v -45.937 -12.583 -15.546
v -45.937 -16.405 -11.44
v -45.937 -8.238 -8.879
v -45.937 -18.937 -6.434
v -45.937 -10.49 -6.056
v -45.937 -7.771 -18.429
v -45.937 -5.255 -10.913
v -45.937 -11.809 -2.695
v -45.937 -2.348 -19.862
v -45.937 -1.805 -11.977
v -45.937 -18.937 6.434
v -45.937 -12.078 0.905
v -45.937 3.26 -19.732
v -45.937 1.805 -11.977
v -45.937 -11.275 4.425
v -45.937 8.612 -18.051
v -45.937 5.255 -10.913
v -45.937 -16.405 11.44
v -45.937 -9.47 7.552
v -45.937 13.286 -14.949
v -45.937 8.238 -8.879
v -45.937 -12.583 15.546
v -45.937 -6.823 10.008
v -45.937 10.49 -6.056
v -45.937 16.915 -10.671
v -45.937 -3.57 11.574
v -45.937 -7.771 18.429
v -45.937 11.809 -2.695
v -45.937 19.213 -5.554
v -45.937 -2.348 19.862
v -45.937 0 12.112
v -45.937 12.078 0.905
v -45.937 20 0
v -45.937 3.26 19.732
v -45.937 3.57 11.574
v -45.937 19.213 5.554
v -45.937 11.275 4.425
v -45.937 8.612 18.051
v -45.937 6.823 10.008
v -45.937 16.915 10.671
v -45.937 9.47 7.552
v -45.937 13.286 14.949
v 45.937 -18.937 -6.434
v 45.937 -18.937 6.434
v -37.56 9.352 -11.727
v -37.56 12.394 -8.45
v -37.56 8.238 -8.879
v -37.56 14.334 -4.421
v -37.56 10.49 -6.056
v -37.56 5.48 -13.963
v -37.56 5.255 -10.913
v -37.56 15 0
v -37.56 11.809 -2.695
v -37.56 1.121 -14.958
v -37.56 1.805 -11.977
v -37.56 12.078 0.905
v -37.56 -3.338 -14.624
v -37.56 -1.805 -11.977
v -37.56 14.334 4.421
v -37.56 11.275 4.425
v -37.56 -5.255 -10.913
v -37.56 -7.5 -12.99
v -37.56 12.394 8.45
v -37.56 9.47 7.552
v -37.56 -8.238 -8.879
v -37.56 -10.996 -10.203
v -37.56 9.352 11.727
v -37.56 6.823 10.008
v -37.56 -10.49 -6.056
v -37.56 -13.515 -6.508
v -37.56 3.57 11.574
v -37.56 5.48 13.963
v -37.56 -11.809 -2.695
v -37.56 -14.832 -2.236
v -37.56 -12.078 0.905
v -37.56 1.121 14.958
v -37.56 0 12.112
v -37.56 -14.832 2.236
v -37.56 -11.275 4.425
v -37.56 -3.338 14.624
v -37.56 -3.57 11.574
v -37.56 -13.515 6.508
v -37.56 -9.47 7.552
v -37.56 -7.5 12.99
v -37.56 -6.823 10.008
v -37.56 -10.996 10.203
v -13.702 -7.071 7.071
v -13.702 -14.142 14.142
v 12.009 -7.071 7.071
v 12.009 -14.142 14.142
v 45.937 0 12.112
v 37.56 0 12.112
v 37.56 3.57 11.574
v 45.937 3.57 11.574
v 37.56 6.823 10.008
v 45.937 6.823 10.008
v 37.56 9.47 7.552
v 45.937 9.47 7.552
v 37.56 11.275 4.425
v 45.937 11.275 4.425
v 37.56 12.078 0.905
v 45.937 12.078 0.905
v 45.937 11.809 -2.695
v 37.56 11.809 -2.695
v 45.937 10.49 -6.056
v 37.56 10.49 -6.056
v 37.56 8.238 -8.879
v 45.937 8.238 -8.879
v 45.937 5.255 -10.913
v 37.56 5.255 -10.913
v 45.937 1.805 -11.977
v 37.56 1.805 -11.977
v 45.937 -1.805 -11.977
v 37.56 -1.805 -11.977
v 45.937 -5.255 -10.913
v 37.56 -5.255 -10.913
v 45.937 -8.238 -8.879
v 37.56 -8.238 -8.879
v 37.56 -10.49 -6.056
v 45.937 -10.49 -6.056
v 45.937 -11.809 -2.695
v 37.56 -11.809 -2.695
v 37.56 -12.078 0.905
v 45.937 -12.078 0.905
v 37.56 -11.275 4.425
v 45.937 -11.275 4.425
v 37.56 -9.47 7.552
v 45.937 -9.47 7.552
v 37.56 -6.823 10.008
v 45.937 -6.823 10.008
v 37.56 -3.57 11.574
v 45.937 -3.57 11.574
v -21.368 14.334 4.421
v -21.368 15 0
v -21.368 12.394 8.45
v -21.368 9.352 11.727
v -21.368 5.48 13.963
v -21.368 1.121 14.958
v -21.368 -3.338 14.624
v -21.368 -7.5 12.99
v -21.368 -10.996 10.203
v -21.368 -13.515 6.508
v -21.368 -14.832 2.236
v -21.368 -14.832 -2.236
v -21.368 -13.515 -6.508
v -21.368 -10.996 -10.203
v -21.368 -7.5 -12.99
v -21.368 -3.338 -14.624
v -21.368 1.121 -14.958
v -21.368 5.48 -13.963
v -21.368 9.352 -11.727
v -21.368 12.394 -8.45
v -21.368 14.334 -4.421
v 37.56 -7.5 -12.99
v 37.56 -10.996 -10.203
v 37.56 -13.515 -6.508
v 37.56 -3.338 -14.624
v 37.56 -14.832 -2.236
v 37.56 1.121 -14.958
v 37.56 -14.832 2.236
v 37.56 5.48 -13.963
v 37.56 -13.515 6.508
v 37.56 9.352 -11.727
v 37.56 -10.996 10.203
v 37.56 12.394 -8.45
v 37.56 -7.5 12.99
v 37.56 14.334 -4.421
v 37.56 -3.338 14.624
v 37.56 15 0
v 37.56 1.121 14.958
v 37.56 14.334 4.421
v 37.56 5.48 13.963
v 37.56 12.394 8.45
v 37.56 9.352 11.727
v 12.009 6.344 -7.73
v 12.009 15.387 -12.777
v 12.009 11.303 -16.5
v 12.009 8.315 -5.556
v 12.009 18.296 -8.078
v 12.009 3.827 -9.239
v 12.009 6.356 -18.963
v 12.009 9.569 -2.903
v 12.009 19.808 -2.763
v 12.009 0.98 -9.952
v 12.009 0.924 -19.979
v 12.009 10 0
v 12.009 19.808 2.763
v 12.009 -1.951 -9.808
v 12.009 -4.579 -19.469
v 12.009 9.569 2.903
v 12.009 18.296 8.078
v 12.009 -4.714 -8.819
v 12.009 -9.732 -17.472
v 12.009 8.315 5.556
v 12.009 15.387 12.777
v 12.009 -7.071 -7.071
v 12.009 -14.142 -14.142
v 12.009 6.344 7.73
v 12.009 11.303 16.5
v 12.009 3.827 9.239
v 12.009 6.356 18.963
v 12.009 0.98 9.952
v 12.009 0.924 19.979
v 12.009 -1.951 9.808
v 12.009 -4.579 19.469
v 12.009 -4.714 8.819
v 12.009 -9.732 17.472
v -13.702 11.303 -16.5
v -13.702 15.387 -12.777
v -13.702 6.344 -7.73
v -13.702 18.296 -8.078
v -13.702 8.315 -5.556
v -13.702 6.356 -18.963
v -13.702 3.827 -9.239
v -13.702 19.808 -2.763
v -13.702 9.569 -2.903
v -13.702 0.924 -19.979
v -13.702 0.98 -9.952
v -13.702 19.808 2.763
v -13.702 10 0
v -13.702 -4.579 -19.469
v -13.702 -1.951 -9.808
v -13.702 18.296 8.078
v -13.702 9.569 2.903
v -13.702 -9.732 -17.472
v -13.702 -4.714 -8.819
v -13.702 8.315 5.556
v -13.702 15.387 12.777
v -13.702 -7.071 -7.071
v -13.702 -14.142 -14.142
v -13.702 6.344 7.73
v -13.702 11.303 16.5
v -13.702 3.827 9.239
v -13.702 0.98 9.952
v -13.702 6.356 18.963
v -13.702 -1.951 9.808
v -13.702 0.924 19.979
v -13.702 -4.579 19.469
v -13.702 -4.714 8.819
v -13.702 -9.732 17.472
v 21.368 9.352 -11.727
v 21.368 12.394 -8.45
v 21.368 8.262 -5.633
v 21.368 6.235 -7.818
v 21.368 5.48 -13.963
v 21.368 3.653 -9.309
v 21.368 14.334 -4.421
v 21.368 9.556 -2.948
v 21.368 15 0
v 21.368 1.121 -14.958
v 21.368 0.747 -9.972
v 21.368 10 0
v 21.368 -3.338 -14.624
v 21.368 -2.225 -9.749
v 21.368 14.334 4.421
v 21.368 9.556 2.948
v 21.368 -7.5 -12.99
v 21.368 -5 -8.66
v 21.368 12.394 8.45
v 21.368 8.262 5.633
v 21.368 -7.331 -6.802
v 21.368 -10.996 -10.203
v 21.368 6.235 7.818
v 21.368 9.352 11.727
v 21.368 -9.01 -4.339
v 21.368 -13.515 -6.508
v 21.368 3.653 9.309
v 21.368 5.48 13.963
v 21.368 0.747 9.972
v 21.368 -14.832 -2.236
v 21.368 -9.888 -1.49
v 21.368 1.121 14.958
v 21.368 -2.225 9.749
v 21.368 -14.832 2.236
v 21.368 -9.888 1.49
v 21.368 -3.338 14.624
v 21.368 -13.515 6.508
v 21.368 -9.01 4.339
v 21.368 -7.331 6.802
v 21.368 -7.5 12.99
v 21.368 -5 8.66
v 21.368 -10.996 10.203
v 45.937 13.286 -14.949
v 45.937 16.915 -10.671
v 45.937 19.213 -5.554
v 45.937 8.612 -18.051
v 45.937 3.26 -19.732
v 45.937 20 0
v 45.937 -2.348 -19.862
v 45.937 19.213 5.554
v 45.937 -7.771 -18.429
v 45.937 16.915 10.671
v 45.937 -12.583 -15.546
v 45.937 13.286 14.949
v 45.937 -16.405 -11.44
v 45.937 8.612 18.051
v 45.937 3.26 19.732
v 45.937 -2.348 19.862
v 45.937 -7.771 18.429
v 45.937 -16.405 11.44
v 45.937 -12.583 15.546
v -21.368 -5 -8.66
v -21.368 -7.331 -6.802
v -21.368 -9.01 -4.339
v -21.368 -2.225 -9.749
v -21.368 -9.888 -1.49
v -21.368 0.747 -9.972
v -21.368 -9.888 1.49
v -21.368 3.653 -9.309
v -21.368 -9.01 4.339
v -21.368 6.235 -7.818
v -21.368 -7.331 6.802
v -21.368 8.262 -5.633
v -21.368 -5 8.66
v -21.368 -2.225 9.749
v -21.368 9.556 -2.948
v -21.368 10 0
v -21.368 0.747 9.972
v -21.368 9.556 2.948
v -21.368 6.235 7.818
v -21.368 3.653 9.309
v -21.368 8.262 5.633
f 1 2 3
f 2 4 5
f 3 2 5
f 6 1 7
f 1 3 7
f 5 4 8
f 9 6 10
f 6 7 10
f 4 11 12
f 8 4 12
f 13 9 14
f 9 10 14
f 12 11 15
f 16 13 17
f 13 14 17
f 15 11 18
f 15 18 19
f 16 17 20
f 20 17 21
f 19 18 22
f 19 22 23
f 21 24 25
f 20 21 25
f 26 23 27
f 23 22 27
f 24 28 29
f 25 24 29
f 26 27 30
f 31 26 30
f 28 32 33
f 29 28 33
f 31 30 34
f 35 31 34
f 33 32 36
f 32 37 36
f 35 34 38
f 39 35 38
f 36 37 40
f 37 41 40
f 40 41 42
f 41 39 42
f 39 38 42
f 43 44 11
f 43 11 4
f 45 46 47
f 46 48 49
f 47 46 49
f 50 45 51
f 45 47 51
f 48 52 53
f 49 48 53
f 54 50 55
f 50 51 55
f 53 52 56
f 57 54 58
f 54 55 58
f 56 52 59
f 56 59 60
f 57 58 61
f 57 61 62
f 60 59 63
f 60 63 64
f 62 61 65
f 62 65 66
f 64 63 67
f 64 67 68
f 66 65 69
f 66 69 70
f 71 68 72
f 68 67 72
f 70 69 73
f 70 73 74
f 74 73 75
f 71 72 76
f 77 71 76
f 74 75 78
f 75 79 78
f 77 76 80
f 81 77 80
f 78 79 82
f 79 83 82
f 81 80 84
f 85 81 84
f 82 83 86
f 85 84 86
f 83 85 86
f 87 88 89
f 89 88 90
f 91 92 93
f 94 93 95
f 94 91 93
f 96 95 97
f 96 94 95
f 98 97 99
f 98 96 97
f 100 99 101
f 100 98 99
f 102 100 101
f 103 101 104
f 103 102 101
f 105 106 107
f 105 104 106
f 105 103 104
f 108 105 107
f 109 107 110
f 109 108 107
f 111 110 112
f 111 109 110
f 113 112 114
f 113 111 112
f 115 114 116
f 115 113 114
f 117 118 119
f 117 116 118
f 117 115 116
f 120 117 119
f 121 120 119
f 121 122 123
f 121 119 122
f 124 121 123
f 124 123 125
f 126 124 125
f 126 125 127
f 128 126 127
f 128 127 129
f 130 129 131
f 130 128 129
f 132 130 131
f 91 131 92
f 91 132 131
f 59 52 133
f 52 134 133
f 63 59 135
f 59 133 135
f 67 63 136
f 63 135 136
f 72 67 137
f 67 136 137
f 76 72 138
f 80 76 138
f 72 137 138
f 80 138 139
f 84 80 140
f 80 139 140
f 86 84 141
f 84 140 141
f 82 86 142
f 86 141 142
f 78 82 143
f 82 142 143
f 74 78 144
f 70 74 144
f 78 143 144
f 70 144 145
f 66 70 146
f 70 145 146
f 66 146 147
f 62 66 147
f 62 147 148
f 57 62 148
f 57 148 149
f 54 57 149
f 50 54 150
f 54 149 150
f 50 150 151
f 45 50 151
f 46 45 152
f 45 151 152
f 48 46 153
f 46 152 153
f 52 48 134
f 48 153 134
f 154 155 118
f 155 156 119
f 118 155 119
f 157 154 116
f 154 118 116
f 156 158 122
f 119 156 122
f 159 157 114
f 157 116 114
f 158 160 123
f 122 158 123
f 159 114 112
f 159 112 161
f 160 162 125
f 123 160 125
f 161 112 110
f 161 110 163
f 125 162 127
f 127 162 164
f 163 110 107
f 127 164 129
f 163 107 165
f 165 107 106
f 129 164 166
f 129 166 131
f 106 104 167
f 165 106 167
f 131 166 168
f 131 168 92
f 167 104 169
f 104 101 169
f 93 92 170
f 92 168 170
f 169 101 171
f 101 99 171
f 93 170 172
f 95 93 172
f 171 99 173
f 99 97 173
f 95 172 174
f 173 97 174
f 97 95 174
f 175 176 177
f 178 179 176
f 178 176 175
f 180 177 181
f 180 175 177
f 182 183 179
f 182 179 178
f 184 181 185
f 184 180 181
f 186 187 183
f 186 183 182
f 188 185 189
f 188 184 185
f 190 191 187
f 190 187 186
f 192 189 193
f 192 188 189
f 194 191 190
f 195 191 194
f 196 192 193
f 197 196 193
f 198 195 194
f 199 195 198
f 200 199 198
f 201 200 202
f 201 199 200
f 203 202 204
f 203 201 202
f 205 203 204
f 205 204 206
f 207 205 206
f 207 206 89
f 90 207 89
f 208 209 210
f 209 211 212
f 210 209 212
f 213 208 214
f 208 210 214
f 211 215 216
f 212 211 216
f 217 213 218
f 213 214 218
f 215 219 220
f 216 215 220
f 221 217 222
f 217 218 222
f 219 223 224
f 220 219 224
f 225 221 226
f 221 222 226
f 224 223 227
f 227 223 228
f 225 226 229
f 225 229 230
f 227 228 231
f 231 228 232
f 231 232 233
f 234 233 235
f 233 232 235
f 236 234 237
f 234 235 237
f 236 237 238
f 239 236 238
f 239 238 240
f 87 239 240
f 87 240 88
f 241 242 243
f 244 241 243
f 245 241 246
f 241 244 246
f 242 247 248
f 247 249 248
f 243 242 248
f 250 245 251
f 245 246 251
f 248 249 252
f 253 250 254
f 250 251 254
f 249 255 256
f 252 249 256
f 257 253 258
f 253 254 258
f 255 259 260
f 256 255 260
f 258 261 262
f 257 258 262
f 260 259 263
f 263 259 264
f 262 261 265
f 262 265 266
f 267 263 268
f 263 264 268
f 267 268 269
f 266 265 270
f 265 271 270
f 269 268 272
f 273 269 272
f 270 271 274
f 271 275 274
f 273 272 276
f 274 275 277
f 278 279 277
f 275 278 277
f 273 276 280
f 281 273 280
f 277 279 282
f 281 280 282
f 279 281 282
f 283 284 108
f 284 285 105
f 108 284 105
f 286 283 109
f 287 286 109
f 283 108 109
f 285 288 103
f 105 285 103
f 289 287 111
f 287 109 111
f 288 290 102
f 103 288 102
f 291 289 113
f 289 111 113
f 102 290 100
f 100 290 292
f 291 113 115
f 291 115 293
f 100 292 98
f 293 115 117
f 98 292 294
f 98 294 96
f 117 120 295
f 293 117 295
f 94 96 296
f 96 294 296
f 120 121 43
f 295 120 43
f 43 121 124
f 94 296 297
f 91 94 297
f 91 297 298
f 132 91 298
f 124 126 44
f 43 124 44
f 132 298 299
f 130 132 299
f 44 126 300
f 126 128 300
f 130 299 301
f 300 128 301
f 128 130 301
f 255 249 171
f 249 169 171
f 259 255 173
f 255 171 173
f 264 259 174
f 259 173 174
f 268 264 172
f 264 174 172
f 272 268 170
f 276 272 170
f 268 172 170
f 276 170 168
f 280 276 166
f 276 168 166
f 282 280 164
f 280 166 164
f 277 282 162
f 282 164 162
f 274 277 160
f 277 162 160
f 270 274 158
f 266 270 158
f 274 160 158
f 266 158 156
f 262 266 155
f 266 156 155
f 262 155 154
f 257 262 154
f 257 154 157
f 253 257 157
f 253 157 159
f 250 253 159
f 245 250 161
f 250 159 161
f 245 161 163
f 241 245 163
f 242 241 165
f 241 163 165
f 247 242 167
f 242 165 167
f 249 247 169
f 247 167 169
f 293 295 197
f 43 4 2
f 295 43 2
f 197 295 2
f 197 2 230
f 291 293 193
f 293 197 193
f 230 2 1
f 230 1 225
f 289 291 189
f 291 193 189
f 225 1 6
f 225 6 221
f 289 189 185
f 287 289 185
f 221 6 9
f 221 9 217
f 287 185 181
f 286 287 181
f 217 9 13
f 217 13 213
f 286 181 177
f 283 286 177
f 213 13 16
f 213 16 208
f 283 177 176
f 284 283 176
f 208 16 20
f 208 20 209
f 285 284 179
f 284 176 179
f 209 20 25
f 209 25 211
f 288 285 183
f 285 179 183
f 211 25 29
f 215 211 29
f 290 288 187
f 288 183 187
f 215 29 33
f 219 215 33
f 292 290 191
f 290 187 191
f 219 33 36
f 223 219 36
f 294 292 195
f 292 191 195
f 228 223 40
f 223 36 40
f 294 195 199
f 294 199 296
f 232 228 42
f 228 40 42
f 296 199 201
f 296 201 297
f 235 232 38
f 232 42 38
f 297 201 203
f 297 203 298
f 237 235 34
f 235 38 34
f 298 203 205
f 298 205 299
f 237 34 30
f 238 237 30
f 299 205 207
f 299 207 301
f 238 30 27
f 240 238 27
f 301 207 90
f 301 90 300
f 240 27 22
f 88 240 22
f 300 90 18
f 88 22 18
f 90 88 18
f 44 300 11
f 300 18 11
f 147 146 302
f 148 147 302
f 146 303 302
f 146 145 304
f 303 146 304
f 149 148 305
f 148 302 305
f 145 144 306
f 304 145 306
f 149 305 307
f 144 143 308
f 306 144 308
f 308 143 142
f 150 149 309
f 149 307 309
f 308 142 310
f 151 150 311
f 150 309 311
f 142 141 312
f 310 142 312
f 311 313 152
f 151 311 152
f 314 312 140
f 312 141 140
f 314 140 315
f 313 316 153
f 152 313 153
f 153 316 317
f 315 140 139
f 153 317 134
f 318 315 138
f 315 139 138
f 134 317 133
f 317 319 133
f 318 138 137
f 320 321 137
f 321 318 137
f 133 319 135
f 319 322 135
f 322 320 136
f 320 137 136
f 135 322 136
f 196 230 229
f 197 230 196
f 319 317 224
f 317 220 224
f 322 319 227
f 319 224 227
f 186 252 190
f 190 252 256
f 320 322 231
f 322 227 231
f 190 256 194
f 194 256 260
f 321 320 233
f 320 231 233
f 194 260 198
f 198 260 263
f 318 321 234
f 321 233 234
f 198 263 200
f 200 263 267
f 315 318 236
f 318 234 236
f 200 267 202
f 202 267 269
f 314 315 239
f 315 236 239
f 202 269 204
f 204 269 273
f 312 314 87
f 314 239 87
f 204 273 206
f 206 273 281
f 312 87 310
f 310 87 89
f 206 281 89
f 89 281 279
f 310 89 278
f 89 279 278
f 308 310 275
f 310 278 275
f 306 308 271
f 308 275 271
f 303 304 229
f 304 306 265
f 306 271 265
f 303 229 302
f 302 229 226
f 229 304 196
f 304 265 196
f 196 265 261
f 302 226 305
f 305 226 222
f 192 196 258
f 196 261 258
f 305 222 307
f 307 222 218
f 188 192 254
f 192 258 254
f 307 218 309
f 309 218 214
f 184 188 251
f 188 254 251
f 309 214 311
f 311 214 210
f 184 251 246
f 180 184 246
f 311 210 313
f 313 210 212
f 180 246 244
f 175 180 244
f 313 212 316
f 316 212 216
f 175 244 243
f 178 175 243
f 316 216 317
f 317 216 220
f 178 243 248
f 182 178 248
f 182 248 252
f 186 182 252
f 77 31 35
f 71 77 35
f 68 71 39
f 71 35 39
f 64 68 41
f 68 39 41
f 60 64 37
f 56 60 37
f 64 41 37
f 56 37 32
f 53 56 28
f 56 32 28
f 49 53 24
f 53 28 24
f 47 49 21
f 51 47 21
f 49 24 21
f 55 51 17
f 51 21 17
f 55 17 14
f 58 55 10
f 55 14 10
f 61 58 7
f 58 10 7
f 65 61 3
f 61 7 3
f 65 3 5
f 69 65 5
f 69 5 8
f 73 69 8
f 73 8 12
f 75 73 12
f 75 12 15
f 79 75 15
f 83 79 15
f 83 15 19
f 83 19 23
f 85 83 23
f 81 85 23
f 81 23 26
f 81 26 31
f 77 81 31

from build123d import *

# Parameters (mm, degrees)
SKETCH2_W               = 25.711141267
SKETCH2_H               = 16.935482271
CUT_REVOLVE1_ANGLE      = 270
SKETCH3_R               = 12.1123055
CUT_EXTRUDE1_DEPTH      = 12
CUT_EXTRUDE2_DEPTH      = 46.936892374
CUT_EXTRUDE2_DEPTH_BACK = 46.936892374


with BuildPart() as part:
    # Sketch1 → Revolve1 (revolve)
    with BuildSketch(Plane.XY):
        Polygon((-21.368212172, 15), (-21.368212172, 10), (21.368212172, 10), (21.368212172, 15), (37.560067367, 15), (37.560067367, 10), (45.936892374, 10), (45.936892374, 20), (-45.936892374, 20), (-45.936892374, 10), (-37.560067367, 10), (-37.560067367, 15), align=None)
    revolve(axis=Axis((-29.383970125, 0, 0), (1, 0, 0)))

    # Sketch2 → Cut-Revolve1 (revolve, symmetric, cut)
    with BuildSketch(Plane.XY) as cut_revolve1_sk:
        with Locations((-0.846360068, 17.320379596)):
            Rectangle(SKETCH2_W, SKETCH2_H)
    revolve(axis=Axis((-31.735702272, 0, 0), (1, 0, 0)), revolution_arc=CUT_REVOLVE1_ANGLE / 2, mode=Mode.SUBTRACT)
    revolve(cut_revolve1_sk.sketch, axis=Axis((-31.735702272, 0, 0), (-1, 0, 0)), revolution_arc=CUT_REVOLVE1_ANGLE / 2, mode=Mode.SUBTRACT)

    # Sketch3 → Cut-Extrude1 (cut)
    with BuildSketch(Plane.ZY.offset(45.936892374)):
        Circle(SKETCH3_R)
    cut_extrude1 = extrude(amount=-CUT_EXTRUDE1_DEPTH, mode=Mode.SUBTRACT)

    # Mirror1: Cut-Extrude1 across plane
    add(cut_extrude1.mirror(Plane(origin=(0, 0, 0), x_dir=(0, 0, 1), z_dir=(1, 0, 0))), mode=Mode.SUBTRACT)

    # Sketch4 → Cut-Extrude2 (cut, two sides)
    with BuildSketch(Plane(origin=(0, 0, 0), x_dir=(0, 0, -1), z_dir=(1, 0, 0))) as cut_extrude2_sk:
        Polygon((-23.278590176, -18.936948358), (32.516125961, -18.936948358), (-2.217008588, -46.464804995), align=None)
    extrude(amount=CUT_EXTRUDE2_DEPTH, mode=Mode.SUBTRACT)
    extrude(cut_extrude2_sk.sketch, amount=-CUT_EXTRUDE2_DEPTH_BACK, mode=Mode.SUBTRACT)


solid = part.part
